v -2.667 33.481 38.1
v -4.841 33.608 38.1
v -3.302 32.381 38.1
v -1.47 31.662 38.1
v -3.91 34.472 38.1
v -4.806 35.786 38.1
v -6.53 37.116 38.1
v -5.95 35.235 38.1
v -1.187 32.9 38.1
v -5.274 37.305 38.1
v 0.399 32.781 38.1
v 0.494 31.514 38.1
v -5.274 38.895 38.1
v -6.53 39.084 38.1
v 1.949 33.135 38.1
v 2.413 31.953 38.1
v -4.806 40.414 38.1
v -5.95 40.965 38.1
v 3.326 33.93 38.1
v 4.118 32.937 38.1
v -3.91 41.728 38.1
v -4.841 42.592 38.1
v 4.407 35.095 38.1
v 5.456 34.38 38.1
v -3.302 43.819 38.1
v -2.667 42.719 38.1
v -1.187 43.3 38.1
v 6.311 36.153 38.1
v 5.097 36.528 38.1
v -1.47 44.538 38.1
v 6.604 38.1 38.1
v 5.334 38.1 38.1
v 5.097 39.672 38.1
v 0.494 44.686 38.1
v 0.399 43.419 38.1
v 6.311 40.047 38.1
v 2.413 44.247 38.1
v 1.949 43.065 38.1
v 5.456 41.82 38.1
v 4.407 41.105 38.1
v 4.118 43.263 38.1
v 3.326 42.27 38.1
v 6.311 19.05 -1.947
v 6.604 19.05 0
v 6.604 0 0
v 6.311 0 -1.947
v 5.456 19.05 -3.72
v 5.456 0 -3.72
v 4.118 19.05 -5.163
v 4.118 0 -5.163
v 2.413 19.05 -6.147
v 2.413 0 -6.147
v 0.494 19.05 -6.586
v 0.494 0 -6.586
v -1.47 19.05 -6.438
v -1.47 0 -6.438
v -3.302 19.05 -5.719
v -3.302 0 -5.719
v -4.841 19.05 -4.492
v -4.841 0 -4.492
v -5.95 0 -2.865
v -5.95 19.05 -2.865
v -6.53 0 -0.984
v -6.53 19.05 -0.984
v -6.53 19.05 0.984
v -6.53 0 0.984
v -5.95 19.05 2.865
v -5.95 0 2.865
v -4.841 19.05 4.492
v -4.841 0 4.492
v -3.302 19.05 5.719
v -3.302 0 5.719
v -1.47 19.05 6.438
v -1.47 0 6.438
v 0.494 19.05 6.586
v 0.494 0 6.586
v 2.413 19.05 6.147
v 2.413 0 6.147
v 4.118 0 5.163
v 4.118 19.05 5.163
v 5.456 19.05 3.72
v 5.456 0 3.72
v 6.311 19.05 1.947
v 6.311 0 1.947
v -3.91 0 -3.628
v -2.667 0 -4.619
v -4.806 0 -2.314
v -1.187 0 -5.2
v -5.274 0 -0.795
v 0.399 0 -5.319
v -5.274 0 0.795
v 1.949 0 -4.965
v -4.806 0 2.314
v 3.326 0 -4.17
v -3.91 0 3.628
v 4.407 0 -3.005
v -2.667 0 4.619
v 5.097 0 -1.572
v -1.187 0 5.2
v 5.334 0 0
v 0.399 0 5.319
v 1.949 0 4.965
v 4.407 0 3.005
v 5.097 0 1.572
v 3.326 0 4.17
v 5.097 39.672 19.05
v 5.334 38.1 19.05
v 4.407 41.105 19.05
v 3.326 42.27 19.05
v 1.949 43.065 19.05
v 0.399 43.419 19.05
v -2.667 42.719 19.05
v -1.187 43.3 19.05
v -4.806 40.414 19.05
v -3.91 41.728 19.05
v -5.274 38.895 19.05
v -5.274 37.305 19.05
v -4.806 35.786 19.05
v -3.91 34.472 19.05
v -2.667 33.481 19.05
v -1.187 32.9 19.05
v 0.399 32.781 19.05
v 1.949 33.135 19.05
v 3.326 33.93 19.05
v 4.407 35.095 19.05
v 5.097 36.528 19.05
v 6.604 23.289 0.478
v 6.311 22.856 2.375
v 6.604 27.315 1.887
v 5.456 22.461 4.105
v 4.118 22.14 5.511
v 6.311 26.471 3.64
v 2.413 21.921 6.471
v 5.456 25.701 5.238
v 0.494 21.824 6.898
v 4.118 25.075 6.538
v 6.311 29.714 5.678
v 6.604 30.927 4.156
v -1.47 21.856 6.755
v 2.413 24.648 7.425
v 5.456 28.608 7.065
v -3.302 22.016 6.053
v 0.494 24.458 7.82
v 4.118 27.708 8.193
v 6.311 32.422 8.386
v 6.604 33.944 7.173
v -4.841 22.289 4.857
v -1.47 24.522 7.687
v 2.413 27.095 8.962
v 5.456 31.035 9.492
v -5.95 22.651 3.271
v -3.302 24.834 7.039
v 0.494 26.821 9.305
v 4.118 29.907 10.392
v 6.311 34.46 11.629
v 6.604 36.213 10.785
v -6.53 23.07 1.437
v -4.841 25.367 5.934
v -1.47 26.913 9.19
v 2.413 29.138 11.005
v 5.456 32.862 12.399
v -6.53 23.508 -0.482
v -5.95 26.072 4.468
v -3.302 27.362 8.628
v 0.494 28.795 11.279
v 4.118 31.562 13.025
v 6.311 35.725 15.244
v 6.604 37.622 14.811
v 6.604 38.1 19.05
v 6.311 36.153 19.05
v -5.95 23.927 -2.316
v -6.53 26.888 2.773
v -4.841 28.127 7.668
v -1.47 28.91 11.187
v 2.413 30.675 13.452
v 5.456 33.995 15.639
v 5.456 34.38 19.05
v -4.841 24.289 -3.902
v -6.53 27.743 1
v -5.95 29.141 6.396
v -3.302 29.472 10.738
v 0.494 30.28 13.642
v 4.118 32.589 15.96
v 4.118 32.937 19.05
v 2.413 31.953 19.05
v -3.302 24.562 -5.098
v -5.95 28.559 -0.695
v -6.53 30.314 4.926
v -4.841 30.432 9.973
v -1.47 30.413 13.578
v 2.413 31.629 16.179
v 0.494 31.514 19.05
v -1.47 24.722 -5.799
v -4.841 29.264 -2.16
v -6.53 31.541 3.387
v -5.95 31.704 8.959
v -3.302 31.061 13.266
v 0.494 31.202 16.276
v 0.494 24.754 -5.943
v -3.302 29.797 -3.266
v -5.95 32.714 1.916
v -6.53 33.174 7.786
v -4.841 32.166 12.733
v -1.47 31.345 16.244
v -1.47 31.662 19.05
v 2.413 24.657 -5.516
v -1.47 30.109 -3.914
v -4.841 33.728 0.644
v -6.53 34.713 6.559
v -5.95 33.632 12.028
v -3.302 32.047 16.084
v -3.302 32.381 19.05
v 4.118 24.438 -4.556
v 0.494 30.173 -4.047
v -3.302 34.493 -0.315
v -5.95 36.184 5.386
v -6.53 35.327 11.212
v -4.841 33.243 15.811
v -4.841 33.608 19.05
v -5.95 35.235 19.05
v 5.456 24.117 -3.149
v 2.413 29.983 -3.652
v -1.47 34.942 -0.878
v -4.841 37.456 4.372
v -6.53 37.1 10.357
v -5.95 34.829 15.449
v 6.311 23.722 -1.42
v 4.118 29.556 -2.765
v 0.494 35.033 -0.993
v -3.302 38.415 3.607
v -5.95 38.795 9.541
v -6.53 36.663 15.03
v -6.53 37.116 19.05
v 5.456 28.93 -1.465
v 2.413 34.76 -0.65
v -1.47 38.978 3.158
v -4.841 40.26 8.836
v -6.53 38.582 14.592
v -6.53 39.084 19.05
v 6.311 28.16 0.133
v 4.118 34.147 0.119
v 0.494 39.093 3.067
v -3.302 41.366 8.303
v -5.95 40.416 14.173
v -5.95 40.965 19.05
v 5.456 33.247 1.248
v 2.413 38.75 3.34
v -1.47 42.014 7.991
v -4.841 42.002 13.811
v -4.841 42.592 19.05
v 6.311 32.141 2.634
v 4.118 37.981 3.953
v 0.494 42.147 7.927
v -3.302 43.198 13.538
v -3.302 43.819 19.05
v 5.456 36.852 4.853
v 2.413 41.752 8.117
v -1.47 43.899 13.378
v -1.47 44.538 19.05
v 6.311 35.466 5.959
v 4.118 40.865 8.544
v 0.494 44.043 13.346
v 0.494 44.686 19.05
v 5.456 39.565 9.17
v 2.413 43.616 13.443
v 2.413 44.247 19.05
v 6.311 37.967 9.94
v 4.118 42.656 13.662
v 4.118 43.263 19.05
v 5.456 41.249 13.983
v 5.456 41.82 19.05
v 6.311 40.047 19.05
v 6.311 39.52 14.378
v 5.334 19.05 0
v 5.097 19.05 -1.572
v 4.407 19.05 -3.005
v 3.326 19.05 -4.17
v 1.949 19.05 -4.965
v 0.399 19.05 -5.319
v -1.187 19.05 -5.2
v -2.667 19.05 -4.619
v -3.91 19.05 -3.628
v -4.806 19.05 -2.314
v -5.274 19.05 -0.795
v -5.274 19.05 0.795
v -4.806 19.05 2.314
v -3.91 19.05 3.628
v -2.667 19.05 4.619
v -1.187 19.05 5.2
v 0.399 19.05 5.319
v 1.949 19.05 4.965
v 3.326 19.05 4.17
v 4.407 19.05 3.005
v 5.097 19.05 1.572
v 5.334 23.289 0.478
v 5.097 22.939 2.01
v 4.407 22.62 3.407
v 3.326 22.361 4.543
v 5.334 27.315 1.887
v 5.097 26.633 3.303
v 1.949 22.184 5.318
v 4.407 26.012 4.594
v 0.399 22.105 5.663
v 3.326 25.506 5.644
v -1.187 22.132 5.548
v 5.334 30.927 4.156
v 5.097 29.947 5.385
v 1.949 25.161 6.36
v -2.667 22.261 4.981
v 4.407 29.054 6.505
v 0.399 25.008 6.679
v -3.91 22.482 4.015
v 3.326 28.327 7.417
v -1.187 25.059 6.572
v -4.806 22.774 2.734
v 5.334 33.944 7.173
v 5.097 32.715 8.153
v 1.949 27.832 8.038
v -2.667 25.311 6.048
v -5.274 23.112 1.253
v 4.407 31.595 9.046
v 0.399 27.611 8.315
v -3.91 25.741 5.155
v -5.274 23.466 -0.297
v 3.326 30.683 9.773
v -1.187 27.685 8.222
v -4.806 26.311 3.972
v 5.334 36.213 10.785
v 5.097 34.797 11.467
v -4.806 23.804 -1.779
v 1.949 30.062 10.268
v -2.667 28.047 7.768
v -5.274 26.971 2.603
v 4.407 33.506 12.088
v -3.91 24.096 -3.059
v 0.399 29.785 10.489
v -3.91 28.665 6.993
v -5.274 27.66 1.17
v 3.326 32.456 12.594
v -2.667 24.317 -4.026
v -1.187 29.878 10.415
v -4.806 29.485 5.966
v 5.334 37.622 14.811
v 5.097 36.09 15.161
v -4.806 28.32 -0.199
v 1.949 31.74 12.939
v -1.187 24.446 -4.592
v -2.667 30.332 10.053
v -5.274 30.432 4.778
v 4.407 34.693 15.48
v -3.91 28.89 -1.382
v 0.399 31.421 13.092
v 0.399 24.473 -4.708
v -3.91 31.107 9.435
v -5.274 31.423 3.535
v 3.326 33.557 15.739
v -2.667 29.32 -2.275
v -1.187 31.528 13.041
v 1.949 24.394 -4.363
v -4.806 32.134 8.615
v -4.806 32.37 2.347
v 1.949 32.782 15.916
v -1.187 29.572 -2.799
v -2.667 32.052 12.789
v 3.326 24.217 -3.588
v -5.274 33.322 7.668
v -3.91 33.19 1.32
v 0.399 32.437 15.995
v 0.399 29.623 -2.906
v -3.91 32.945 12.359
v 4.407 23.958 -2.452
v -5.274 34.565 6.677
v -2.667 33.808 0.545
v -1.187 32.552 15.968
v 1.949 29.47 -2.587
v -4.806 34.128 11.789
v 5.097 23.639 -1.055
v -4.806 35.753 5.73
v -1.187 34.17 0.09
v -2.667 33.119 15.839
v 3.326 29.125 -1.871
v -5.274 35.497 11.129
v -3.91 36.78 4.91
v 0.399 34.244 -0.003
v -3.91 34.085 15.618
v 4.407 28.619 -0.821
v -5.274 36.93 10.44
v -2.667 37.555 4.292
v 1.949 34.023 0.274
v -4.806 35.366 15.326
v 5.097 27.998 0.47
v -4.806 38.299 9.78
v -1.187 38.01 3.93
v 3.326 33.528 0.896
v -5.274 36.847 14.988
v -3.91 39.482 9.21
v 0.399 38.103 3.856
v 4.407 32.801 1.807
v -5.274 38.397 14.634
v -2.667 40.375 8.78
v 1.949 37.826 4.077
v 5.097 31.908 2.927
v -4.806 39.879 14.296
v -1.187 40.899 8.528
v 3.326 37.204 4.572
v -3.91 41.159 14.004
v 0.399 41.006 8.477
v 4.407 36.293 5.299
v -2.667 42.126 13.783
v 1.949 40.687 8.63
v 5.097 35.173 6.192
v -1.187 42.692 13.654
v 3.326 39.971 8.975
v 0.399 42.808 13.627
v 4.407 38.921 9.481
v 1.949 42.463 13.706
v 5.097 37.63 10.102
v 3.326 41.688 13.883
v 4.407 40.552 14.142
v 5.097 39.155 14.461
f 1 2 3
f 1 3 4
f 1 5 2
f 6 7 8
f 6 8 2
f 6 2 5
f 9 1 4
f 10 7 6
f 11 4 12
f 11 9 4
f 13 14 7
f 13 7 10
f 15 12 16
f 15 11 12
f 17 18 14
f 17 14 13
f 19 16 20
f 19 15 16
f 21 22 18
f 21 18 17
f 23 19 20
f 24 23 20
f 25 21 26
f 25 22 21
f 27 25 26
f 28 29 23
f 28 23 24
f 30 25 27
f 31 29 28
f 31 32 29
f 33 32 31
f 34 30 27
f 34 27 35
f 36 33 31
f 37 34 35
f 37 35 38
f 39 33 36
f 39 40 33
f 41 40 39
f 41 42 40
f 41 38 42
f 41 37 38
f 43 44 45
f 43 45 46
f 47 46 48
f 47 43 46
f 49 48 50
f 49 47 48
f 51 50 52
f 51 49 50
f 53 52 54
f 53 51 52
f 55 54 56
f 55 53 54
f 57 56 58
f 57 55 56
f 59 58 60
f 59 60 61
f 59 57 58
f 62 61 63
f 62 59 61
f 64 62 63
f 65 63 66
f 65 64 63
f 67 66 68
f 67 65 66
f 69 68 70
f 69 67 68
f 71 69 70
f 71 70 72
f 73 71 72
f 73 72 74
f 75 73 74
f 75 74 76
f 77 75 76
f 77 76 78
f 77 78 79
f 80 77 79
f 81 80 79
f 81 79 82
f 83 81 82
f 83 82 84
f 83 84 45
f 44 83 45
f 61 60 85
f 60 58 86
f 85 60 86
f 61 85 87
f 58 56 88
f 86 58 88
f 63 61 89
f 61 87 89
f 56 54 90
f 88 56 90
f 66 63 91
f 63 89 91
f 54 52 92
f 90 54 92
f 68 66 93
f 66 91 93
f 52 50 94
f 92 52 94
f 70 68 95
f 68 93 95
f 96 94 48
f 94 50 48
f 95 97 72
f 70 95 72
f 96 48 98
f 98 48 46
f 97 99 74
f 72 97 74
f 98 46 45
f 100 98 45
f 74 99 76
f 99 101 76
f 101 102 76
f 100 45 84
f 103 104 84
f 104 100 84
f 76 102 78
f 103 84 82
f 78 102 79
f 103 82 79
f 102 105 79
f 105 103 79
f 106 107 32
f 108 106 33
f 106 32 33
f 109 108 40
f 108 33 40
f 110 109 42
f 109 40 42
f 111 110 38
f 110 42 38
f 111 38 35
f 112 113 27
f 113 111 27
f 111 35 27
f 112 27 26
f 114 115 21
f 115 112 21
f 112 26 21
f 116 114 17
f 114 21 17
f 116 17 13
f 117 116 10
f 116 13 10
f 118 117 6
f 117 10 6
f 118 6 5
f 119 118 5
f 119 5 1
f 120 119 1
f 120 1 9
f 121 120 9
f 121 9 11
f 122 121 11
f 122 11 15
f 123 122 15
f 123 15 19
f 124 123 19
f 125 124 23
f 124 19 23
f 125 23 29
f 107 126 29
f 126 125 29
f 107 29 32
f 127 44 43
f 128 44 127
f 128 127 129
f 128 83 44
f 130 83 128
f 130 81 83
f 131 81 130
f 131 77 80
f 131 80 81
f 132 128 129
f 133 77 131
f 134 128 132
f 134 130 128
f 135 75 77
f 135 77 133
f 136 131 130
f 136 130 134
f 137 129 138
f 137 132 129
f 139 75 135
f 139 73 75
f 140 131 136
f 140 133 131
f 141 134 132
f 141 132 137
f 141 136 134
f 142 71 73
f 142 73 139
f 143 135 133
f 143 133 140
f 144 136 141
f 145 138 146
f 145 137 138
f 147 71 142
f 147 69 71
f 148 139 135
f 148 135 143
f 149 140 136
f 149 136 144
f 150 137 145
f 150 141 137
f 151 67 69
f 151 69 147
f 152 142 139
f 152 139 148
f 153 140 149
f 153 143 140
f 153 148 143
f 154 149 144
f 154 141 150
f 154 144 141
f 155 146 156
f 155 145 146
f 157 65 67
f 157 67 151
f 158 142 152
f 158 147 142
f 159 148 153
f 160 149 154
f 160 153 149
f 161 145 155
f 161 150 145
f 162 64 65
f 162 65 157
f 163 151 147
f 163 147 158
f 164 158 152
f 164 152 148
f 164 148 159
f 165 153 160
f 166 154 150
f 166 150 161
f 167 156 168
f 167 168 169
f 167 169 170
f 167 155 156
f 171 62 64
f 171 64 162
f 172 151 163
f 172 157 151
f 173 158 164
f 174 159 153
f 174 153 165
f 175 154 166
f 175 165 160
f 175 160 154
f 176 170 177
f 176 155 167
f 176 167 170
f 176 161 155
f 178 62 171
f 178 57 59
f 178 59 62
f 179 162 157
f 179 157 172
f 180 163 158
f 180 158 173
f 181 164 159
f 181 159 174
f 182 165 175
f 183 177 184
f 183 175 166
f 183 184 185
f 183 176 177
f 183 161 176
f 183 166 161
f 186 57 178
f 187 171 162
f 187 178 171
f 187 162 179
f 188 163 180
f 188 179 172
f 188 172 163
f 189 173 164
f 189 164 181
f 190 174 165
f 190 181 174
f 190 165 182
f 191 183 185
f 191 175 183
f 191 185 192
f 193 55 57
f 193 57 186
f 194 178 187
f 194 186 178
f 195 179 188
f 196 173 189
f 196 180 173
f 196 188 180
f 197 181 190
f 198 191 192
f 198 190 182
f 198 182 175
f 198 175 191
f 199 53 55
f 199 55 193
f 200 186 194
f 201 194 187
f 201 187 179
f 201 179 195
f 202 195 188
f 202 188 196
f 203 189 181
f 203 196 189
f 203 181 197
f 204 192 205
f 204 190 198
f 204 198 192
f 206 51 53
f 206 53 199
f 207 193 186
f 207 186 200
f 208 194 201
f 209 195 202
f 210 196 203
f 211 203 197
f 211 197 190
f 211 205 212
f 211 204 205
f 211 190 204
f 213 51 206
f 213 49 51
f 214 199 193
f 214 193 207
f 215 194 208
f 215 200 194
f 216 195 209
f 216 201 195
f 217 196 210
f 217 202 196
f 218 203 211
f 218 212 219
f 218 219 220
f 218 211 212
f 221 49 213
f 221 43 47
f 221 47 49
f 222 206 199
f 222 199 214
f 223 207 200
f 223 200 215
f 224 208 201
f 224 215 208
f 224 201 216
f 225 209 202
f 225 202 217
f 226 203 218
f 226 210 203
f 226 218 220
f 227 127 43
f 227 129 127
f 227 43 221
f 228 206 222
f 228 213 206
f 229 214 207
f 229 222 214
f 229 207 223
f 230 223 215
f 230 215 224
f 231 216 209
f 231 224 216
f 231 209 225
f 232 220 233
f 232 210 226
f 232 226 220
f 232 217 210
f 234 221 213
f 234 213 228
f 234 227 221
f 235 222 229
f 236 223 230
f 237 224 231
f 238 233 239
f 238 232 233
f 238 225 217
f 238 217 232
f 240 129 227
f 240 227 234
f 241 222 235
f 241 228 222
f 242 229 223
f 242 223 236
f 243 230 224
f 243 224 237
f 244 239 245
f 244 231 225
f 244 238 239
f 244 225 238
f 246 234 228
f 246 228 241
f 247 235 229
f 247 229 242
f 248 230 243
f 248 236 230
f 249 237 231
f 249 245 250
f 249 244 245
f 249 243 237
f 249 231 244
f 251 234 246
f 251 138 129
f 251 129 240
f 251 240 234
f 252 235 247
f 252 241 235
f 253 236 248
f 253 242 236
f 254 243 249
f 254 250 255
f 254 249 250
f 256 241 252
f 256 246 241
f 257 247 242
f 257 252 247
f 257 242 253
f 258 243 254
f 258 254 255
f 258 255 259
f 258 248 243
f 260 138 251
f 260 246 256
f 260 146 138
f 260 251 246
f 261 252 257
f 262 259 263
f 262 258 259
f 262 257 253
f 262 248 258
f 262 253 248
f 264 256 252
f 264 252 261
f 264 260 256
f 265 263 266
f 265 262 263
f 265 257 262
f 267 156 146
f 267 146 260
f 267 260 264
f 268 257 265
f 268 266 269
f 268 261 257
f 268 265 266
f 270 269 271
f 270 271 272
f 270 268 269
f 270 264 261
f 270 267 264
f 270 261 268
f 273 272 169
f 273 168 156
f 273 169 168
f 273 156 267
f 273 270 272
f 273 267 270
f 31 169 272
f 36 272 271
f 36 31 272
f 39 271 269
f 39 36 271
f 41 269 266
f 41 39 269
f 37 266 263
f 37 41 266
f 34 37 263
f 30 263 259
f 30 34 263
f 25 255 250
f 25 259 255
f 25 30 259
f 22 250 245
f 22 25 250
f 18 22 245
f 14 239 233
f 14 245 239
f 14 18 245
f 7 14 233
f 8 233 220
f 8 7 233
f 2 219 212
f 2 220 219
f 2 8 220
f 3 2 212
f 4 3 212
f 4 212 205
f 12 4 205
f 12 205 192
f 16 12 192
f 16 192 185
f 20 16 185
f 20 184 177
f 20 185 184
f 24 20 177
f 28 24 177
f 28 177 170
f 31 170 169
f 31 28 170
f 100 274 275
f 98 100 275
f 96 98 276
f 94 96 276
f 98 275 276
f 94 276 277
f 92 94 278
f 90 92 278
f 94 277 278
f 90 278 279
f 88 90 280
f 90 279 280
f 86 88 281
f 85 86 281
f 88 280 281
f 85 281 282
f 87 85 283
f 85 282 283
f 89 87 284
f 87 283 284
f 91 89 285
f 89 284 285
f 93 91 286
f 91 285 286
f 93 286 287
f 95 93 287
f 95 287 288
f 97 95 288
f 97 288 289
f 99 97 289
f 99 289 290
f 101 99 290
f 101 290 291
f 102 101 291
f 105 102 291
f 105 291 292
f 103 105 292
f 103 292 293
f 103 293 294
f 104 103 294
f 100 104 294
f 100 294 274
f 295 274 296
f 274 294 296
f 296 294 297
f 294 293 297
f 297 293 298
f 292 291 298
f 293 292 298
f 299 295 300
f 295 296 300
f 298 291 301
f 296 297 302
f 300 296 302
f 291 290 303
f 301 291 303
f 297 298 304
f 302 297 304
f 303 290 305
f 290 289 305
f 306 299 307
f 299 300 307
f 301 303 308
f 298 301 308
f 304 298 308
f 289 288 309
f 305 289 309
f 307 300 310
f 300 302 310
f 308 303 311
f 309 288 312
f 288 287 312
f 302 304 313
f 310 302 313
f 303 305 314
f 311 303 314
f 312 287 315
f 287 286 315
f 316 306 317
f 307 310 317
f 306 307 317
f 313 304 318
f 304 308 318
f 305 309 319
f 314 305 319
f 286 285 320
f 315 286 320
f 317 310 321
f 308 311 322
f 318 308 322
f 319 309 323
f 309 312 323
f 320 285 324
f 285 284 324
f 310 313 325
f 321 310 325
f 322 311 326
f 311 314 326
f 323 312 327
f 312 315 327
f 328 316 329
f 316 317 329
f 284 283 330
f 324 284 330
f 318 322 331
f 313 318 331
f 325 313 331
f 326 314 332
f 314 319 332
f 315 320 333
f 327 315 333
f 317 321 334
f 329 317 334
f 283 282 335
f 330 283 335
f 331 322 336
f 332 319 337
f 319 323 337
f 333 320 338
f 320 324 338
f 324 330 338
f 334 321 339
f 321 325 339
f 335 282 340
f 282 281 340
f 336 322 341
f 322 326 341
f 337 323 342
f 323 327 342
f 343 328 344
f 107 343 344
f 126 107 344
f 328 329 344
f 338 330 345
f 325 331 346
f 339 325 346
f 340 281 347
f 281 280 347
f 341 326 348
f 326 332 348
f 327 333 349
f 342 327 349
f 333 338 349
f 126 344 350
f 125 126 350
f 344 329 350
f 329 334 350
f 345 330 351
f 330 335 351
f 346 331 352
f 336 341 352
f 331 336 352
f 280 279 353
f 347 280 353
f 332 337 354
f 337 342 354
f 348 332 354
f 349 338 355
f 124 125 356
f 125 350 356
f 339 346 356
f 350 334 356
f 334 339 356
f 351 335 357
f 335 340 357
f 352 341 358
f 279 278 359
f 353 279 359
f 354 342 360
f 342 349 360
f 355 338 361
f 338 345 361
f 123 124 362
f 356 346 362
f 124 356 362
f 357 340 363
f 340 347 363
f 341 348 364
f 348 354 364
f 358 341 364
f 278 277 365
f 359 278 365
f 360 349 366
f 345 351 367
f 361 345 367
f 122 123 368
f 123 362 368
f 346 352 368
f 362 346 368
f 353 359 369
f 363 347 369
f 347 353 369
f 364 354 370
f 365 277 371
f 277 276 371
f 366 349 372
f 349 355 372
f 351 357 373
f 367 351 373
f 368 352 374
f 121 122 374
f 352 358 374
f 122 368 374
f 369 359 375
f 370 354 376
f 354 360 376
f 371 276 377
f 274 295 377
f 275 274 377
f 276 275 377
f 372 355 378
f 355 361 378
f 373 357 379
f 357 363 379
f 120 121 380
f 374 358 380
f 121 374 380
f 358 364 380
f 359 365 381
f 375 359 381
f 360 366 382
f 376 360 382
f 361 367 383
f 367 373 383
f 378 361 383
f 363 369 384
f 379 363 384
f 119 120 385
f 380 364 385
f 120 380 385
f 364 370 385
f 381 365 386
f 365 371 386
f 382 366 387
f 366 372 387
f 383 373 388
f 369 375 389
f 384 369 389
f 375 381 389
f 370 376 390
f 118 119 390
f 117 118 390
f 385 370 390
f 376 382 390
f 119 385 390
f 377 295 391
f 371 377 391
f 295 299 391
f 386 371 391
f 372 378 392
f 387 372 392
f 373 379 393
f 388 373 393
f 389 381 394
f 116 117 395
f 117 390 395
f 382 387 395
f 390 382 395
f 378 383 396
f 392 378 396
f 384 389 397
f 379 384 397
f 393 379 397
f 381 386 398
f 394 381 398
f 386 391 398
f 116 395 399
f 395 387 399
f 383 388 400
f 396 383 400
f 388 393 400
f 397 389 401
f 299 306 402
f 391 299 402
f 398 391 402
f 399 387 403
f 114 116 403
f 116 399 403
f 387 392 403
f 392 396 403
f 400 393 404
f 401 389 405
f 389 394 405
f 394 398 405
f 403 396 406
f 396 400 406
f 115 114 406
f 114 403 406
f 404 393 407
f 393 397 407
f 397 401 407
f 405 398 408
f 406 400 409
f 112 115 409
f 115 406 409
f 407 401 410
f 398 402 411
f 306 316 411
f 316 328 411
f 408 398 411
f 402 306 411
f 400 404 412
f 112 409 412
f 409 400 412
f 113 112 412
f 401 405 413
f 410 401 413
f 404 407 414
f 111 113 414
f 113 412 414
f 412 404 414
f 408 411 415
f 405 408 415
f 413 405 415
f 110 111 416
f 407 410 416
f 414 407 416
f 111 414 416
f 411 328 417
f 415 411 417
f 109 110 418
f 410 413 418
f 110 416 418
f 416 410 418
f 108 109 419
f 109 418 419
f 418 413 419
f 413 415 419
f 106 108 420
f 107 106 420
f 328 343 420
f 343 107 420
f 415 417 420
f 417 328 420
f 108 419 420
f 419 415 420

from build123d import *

# Parameters (mm, degrees)
SKETCH2_R   = 6.604
SKETCH2_R_2 = 5.334


with BuildPart() as part:
    # Sweep-Thin1: sweep along a path in Sketch1
    with BuildLine(Plane(origin=(0, 0, 0), x_dir=(0, 0, -1), z_dir=(1, 0, 0))) as sweep_thin1_path:
        Line((0, 0), (0, 19.05))
        ThreePointArc((0, 19.05), (-5.579615818, 32.520384182), (-19.05, 38.1))
        Line((-19.05, 38.1), (-38.1, 38.1))
    # Sketch2 → Sweep-Thin1 (sweep)
    with BuildSketch(Plane(origin=(0, 0, 0), x_dir=(1, 0, 0), z_dir=(0, 1, 0))):
        Circle(SKETCH2_R)
        Circle(SKETCH2_R_2, mode=Mode.SUBTRACT)
    sweep(path=sweep_thin1_path.line)


solid = part.part
